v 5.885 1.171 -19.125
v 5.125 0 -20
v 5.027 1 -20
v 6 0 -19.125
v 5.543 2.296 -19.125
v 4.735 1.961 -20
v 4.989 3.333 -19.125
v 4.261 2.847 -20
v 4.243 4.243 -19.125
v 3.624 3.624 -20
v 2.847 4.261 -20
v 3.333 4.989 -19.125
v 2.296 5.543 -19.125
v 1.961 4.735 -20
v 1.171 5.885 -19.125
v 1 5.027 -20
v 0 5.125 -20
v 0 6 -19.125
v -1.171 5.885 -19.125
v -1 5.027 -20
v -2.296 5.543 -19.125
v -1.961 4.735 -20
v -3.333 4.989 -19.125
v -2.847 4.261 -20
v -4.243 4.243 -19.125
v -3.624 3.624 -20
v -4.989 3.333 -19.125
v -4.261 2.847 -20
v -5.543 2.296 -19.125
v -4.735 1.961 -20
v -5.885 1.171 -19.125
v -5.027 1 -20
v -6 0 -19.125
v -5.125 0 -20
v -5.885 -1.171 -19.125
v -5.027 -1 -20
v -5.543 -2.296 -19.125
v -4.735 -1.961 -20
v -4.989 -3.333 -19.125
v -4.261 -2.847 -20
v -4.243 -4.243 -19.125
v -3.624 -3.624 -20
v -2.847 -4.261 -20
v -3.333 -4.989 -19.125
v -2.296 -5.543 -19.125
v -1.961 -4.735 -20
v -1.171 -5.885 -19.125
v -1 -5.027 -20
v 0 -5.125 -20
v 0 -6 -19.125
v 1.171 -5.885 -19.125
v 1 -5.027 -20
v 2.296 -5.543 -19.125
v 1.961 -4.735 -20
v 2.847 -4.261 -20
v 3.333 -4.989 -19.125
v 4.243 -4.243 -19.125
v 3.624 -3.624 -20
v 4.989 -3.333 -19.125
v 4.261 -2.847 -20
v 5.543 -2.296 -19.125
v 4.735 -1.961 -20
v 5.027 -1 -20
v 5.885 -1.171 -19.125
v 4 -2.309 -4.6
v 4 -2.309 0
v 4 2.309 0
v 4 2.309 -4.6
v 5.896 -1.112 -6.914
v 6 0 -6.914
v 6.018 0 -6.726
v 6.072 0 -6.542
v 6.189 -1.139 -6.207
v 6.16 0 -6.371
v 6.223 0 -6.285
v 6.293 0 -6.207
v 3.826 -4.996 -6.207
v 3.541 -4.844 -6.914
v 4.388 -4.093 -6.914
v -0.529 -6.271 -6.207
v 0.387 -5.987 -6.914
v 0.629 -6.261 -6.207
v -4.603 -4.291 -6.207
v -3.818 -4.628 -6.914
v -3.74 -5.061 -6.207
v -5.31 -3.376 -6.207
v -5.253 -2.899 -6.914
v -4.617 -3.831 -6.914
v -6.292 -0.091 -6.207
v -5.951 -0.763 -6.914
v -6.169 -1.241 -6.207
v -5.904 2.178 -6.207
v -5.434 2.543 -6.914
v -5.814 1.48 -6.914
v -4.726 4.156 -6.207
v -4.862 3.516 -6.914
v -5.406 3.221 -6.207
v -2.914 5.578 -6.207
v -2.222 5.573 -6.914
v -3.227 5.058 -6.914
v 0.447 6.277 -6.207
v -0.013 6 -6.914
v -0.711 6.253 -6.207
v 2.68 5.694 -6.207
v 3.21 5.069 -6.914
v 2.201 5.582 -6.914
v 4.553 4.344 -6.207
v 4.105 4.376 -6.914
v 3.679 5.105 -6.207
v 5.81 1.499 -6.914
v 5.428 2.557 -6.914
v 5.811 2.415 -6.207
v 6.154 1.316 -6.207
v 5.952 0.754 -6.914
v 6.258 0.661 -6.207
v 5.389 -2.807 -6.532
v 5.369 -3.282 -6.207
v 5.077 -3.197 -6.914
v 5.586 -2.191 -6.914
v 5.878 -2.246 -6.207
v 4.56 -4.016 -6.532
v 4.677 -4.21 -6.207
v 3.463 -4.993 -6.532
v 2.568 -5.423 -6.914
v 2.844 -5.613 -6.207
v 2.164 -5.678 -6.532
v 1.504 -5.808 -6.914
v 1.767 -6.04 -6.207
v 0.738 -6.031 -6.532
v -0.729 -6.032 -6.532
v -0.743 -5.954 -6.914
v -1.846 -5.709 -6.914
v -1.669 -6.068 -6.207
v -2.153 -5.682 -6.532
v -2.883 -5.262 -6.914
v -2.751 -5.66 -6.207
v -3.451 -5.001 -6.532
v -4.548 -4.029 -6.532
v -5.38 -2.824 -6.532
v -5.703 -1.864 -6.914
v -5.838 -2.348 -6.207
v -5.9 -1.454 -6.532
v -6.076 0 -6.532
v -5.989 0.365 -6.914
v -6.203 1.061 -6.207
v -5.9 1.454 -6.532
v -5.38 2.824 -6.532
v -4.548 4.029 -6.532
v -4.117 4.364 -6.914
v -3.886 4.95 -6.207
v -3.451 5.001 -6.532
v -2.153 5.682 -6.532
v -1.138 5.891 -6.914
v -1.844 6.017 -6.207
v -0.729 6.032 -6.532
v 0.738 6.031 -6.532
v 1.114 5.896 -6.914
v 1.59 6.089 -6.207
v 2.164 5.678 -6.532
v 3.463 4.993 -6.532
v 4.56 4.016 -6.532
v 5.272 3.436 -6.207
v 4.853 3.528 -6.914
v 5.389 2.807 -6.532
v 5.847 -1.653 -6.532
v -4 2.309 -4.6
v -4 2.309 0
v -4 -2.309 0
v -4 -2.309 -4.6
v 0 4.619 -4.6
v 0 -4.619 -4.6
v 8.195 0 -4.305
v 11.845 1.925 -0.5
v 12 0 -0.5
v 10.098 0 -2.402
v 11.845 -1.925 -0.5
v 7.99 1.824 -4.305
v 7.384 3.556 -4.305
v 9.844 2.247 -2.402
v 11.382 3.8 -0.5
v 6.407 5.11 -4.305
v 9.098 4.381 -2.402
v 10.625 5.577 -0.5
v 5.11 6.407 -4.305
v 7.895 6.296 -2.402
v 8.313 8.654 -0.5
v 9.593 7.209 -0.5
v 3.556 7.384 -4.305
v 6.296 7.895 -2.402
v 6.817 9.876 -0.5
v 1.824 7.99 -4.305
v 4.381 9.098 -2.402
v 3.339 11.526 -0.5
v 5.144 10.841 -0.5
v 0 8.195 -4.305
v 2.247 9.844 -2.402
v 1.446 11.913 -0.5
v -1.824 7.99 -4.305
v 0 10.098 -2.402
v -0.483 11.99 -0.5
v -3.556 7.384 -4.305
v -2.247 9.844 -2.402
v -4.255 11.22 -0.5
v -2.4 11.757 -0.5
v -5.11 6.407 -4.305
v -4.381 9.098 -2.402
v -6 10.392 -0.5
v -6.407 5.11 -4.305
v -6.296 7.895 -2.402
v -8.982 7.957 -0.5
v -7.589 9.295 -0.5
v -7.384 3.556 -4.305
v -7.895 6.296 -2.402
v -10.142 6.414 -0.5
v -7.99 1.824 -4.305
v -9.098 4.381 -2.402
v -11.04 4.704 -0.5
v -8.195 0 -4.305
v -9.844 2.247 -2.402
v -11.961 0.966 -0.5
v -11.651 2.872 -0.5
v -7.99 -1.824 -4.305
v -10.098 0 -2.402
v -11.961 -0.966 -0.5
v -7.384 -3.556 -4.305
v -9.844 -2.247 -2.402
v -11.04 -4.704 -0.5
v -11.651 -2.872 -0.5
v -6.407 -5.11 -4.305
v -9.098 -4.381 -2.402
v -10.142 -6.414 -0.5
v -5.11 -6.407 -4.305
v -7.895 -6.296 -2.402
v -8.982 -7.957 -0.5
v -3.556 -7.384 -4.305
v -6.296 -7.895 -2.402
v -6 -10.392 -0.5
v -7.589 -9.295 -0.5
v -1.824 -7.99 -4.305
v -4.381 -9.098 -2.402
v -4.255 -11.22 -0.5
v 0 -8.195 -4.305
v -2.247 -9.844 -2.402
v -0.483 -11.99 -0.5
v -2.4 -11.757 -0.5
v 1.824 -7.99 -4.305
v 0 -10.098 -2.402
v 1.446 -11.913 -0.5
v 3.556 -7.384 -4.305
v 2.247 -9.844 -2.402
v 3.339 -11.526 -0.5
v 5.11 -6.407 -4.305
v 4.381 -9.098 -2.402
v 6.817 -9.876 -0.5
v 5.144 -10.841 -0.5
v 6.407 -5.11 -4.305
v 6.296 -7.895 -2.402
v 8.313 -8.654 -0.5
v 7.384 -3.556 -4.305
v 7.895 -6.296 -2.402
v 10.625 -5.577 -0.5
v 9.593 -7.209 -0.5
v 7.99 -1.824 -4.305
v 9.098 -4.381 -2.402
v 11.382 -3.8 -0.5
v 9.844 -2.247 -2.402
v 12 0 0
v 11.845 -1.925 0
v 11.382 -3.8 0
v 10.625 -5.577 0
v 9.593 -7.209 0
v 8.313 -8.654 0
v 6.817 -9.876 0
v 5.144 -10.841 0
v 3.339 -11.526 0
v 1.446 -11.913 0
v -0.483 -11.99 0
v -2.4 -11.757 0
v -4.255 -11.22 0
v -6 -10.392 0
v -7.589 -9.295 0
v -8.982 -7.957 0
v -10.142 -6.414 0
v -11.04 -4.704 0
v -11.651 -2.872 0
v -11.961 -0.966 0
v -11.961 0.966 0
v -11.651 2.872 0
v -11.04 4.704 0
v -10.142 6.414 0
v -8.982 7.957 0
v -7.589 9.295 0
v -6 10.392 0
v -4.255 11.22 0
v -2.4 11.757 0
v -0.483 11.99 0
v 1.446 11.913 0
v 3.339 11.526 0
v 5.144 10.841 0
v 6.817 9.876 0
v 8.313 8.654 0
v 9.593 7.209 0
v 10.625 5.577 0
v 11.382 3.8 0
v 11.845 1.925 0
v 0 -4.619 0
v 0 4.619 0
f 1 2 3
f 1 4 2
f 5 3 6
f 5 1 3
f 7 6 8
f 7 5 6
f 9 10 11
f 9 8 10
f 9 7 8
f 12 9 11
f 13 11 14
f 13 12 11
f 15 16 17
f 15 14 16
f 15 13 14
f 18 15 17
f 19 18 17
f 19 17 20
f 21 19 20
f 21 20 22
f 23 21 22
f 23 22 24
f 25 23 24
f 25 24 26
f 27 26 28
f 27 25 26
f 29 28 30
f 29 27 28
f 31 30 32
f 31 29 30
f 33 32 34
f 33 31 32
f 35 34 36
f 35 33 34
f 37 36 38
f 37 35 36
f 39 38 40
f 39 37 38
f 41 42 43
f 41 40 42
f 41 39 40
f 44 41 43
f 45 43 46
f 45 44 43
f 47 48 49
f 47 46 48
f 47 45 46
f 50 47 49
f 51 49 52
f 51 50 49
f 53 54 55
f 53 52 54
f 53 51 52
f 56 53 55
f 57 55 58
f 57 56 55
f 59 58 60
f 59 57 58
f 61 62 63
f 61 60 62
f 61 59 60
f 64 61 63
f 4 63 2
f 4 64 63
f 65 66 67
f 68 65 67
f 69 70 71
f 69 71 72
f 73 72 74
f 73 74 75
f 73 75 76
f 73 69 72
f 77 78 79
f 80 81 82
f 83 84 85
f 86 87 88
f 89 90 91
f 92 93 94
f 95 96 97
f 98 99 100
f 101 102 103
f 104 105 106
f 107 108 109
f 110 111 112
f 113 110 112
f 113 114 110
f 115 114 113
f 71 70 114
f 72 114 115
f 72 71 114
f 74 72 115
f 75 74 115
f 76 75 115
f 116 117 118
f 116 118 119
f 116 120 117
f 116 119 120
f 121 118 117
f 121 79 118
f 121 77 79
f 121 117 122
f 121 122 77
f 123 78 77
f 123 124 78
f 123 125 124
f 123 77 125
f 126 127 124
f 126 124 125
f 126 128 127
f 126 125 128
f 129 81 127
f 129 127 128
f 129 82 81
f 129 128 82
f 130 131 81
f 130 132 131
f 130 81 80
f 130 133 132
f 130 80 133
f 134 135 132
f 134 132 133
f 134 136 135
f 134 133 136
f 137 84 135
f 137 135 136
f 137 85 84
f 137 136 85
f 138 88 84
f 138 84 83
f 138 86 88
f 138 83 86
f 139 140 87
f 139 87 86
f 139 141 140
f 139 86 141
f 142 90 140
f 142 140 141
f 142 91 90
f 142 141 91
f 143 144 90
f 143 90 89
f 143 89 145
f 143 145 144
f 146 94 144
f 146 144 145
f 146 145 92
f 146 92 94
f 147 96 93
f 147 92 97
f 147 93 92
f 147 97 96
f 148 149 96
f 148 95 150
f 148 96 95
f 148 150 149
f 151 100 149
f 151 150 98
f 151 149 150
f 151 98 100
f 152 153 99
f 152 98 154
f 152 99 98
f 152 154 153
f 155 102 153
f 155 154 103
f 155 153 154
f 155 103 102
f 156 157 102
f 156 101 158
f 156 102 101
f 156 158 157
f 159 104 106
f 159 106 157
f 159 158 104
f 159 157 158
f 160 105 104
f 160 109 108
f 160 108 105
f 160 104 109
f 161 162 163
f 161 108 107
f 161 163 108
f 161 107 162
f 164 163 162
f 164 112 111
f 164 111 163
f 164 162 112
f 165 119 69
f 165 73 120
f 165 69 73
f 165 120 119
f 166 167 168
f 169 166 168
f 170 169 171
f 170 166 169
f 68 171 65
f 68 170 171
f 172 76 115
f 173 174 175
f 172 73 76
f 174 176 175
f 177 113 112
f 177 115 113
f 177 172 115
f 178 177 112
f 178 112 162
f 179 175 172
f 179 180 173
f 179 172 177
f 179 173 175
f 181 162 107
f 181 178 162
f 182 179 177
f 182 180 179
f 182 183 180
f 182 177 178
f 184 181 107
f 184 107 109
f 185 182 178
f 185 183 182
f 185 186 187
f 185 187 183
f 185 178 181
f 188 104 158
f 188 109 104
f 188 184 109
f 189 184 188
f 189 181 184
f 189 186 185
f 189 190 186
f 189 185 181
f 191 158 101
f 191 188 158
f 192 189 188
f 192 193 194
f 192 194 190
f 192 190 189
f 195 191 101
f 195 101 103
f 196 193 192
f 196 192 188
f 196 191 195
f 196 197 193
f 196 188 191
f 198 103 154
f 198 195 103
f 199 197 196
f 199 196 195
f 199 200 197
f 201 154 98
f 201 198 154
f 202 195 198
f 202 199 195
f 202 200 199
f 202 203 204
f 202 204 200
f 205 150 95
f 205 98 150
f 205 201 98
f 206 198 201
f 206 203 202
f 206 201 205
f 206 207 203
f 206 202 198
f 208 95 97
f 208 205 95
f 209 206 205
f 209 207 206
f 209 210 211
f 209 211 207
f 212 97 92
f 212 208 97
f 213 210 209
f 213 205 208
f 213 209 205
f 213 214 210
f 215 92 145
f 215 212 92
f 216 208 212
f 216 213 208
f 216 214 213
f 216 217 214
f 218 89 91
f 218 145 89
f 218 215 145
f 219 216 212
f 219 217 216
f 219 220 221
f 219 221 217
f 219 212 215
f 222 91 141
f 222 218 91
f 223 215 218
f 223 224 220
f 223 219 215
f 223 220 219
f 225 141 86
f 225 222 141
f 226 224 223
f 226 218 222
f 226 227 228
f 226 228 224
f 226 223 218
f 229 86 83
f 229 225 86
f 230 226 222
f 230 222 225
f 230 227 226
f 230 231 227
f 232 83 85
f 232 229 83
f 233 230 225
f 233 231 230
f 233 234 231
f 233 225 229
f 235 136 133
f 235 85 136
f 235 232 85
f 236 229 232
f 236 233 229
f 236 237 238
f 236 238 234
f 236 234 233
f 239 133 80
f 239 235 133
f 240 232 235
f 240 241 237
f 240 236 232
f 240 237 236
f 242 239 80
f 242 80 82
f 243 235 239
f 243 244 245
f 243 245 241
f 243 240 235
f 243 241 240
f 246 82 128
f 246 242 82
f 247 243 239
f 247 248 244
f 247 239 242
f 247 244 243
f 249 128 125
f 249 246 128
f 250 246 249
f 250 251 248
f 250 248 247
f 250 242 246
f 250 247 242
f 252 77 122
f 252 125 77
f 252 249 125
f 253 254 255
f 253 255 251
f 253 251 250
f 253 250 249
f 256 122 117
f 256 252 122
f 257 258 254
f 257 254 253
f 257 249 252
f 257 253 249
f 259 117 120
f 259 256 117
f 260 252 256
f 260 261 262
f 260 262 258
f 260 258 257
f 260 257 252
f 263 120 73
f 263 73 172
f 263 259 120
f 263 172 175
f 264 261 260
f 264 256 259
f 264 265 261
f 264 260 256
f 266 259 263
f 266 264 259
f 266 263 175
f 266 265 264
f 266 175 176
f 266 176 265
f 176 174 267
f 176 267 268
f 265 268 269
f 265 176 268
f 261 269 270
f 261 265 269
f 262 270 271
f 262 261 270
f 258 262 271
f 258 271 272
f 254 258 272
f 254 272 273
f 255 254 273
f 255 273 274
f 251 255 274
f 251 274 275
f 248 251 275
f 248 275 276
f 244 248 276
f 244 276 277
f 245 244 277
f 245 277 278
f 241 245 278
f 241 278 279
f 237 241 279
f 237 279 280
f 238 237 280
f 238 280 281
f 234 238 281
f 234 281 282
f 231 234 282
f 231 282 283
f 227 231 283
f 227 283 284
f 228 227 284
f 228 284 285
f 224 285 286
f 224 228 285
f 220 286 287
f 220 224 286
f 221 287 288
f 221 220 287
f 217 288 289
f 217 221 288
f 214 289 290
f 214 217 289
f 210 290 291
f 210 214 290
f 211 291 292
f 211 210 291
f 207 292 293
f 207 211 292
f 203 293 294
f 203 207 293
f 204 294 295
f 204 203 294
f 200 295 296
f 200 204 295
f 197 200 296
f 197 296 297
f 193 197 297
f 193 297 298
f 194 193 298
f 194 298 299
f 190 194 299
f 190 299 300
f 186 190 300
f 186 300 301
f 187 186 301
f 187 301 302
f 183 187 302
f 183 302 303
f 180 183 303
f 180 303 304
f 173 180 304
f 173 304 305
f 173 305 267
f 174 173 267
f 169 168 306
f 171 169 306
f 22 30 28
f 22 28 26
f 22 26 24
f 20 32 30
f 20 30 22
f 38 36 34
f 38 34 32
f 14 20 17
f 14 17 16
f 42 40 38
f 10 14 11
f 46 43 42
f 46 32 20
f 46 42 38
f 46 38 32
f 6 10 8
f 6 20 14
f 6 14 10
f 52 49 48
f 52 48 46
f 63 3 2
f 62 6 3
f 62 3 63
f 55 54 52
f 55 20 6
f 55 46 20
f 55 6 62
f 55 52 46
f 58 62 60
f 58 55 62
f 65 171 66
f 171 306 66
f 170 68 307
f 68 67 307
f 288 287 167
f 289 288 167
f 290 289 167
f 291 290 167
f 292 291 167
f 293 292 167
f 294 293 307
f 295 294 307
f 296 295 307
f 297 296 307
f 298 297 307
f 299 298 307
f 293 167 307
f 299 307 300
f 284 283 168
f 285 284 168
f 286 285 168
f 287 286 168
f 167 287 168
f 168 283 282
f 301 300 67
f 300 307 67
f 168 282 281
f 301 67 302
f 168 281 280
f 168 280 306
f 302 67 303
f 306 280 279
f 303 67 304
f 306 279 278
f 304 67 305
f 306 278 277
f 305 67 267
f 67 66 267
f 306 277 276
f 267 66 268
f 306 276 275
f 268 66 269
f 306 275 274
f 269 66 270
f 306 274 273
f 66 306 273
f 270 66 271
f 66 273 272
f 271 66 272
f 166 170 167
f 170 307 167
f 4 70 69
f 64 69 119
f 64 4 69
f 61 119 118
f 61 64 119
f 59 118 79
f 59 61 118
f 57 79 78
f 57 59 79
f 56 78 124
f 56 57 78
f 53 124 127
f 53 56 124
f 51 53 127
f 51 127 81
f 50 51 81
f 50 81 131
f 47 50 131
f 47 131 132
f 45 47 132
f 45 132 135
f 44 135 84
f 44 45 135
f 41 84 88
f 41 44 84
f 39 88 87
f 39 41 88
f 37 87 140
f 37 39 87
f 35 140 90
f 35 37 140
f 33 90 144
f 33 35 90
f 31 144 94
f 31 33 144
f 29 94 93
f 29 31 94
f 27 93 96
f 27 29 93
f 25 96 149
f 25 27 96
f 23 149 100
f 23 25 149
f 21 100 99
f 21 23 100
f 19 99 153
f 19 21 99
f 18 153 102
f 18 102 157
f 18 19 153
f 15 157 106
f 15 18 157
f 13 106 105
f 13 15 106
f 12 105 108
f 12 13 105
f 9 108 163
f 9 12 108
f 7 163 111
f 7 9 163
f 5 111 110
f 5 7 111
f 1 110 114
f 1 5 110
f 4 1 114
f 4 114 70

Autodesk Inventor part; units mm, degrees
ref_plane "YZ Plane" through (0, 0, 0) normal (1, 0, 0) x (0, 1, 0)
sketch "Sketch1" plane through (0, 0, 0) normal (0, 1, 0) x (-1, 0, 0)
  point P0 (0, 0)
sketch "Sketch2" plane through (0, 0, 0) normal (0, 1, 0) x (-1, 0, 0)
  line L0 (-6, -20) -> (0, -20)
  line L1 (-6, -6.5) -> (-6, -20)
  line L2 (-12, -0.5) -> (-6, -6.5)
  line L3 (-12, 0) -> (-12, -0.5)
  line L4 (0, 0) -> (-12, 0)
  line L5 (0, -20) -> (0, 0)
  line L6 (0, -20) -> (0, 0)
  line L7 (0, -24) -> (0, 4) projected
  line L8 (2.4, 0) -> (-14.4, 0) projected
  dimension "d3" = 12
  dimension "d5" = 6
  dimension "d7" = 20
  dimension "ParC" = 0.5
  dimension "d22" = 0
  dimension "d23" = 0
  dimension "d43" = 45
revolve "Revolution1" add sketch "Sketch2" angle 360 about axis through (0, 0, -20) along (0, 0, -1)
sketch "Sketch3" plane through (0, 0, 0) normal (0, 0, 1) x (1, 0, 0)
  line L0 (-4, 2.3094) -> (-4, -2.3094)
  line L1 (0, 4.6188) -> (-4, 2.3094)
  line L2 (4, 2.3094) -> (0, 4.6188)
  line L3 (4, -2.3094) -> (4, 2.3094)
  line L4 (0, -4.6188) -> (4, -2.3094)
  line L5 (-4, -2.3094) -> (0, -4.6188)
  circle A0 centre (0, 0) radius 4 construction
  circle A1 centre (0, 0) radius 6 construction
  dimension "d11" = 8
  dimension "d13" = 120
  dimension "d15" = 120
extrude "Extrusion1" cut sketch "Sketch3" against normal blind 4.6
fillet "Fillet1" radius 1 1 edges at (-6, 0, -6.5)
chamfer "Chamfer1" distance 0.875 angle 45 1 edges at (-6, 0, -20) measured on face at (5.6201, 2.1011, -15.6381)
thread "Thread1" size "M12x1.75" class "6g" standard "ISO Metric profile" length 10
ref_plane "MSC_PF1" through (0, 0, 0) normal (1, 0, 0) x (0, 1, 0)
ref_plane "MSC_PT1" through (0, 0, 0) normal (0, 0, -1) x (-1, 0, 0)
equation "\"d18\" = r"
equation "\"d19\" = 0.5 * PTC"
equation "\"d39\" = 0.5 * PTC"
equation "\"d3\" = 0.5 * dk"
equation "\"d5\" = 0.5 * NND"
equation "\"d7\" = NLG"
equation "\"d43\" = 0.5 * ang"
equation "\"d11\" = ParS"
equation "\"d16\" = ParT"
equation "\"NND\" = 12"
equation "\"PTC\" = 1.75"
equation "\"dk\" = 24"
equation "\"ParK\" = 6.5"
equation "\"ParS\" = 8"
equation "\"ParT\" = 4.6"
equation "\"r\" = 1"
equation "\"NLG\" = 20"
equation "\"ang\" = 90deg"
equation "\"THREADDIA\" = NND"
properties part number "DIN 7991 - M12x20" material "Steel, Mild"
